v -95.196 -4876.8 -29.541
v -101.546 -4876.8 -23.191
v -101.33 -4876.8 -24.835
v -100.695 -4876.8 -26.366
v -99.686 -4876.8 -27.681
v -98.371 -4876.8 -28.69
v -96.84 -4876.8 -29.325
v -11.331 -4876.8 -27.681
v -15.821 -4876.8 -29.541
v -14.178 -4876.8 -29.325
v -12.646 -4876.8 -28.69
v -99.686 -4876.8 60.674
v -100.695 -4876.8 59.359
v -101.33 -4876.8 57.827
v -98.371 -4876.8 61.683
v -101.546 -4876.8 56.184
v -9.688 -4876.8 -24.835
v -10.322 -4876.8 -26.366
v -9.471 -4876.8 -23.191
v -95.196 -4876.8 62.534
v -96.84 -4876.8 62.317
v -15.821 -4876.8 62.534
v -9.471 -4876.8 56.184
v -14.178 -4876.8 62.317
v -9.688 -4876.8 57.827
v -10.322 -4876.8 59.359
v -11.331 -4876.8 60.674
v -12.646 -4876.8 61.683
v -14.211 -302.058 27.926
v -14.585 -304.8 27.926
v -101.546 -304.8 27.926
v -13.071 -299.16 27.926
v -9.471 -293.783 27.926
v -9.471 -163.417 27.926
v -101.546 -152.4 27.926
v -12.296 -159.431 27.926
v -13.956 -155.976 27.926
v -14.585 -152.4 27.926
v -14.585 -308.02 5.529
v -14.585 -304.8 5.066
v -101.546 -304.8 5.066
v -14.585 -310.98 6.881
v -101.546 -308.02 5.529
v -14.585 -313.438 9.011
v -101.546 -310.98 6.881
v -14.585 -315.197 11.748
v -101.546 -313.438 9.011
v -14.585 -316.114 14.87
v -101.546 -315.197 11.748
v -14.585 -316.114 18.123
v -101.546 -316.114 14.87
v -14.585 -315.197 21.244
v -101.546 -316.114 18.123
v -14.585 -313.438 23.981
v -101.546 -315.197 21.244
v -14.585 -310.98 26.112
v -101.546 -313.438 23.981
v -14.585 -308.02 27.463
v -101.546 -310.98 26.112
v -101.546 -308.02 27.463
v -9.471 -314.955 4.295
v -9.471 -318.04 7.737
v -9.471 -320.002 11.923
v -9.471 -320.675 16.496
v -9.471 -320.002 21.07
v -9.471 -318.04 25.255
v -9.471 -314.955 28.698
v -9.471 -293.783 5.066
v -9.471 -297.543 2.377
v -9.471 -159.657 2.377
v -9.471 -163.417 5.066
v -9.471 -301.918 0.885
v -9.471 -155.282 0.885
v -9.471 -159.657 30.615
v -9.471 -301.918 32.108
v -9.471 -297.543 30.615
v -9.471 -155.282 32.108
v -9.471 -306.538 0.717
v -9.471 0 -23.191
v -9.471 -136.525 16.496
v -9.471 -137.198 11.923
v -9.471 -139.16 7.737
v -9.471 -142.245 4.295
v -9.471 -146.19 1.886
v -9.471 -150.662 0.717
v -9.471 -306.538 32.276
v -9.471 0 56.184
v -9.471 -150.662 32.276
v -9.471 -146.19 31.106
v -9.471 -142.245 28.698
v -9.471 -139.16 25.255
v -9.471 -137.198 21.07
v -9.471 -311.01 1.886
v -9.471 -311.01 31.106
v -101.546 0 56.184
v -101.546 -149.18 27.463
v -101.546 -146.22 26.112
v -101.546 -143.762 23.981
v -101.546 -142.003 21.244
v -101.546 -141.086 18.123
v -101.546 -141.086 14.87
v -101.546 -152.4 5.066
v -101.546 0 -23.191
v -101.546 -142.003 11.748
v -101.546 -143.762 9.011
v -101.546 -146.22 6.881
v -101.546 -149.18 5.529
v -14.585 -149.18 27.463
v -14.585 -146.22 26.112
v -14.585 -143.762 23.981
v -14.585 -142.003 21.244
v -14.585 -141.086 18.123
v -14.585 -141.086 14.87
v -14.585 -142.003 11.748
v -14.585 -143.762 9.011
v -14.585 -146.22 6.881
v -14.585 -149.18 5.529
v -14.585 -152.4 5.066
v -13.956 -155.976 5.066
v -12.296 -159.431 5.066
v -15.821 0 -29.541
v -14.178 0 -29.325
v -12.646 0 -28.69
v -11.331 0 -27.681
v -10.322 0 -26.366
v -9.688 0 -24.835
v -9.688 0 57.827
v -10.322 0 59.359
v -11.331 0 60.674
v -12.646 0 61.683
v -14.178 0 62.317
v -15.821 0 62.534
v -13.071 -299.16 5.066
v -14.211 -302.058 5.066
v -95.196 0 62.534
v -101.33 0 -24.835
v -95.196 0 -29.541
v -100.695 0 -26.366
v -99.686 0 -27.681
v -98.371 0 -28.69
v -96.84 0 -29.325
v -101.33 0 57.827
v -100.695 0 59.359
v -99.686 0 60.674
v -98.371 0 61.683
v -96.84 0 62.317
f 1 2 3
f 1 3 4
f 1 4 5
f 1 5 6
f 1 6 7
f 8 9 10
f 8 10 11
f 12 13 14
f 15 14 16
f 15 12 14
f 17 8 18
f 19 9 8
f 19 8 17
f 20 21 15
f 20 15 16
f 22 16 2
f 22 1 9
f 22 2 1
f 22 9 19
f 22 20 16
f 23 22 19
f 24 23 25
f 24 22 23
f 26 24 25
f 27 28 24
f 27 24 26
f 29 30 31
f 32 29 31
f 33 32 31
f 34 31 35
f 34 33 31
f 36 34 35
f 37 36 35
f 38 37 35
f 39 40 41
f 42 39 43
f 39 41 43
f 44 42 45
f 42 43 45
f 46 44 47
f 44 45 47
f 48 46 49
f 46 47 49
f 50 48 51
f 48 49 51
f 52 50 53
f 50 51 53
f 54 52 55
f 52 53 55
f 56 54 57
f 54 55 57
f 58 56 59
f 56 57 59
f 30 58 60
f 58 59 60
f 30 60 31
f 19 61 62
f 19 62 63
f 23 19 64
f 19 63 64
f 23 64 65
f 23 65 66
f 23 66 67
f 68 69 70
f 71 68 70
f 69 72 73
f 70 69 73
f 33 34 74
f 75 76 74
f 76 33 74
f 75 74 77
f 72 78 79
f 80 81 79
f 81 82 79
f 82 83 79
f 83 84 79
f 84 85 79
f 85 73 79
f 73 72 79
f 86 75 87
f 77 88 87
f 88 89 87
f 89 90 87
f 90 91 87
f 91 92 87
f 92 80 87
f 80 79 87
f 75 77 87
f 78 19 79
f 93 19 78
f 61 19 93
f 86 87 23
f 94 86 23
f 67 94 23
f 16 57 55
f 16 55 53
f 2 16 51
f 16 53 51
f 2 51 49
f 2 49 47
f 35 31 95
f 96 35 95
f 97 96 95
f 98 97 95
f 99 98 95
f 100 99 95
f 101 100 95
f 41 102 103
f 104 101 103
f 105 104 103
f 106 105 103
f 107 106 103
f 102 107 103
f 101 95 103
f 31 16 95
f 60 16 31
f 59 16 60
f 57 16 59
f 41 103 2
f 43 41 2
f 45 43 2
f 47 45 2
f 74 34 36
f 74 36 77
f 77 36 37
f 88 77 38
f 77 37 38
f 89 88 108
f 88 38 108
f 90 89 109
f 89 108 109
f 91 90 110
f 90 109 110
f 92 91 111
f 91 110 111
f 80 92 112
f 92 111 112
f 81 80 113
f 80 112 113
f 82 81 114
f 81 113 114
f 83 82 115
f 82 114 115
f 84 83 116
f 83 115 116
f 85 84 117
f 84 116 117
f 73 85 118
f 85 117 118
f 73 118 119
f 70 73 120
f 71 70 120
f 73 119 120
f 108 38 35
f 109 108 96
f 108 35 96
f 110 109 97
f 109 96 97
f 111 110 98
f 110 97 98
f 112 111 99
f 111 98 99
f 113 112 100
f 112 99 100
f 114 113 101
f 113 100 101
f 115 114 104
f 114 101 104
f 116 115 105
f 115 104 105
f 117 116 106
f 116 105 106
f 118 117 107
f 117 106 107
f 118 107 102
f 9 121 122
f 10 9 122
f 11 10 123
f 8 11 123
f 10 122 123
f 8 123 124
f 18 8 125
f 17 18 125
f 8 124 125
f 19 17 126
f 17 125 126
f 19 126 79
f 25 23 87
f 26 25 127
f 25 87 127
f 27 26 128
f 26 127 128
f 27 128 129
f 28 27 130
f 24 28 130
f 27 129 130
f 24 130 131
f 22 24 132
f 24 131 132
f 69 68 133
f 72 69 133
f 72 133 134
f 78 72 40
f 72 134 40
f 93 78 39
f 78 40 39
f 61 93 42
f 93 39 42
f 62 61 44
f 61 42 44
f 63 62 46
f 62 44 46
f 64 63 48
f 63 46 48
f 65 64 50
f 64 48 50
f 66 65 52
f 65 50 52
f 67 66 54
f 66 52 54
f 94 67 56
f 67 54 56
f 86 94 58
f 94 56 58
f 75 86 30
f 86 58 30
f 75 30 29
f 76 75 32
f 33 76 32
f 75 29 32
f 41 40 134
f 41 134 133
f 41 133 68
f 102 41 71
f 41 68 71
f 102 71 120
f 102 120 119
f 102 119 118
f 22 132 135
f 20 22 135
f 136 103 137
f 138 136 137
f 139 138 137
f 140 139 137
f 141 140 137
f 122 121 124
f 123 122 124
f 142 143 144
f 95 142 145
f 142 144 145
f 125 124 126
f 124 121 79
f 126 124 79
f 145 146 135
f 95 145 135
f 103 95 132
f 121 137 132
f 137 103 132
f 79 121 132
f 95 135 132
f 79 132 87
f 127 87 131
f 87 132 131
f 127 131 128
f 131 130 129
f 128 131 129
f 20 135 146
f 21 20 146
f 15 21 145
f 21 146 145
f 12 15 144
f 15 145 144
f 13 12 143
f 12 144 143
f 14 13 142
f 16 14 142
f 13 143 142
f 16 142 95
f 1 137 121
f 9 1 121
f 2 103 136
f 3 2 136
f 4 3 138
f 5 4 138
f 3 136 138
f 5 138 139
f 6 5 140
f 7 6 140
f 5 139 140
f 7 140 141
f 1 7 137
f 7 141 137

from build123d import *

# Parameters (mm, degrees)
F1_DEPTH       = 4876.8
F3_D           = 22.86
F3_CSINK_D     = 31.75
F3_CSINK_ANGLE = 82
F4_D           = 22.86
F4_CSINK_D     = 31.75
F4_CSINK_ANGLE = 82
F5_W           = 152.4
F5_H           = 22.86
F6_DEPTH       = 101.6


with BuildPart() as f1:
    # F0 (on Front) → F1 (new body)
    with BuildSketch(Plane.XZ):
        with BuildLine():
            Line((-15.821142, 62.533787), (-95.196142, 62.533787))
            ThreePointArc((-95.196142, 62.533787), (-99.686271, 60.673915), (-101.546142, 56.183787))
            Line((-101.546142, 56.183787), (-101.546142, -23.191213))
            ThreePointArc((-101.546142, -23.191213), (-99.686271, -27.681341), (-95.196142, -29.541213))
            Line((-95.196142, -29.541213), (-15.821142, -29.541213))
            ThreePointArc((-15.821142, -29.541213), (-11.331014, -27.681341), (-9.471142, -23.191213))
            Line((-9.471142, -23.191213), (-9.471142, 56.183787))
            ThreePointArc((-9.471142, 56.183787), (-11.331014, 60.673915), (-15.821142, 62.533787))
        make_face()
    extrude(amount=F1_DEPTH)

    # F3 (through all)
    with Locations(Plane.YZ.offset(-9.471142)):
        with Locations((-304.8, 16.496287)):
            CounterSinkHole(F3_D / 2, F3_CSINK_D / 2, counter_sink_angle=F3_CSINK_ANGLE)

    # F4 (through all)
    with Locations(Plane.YZ.offset(-9.471142)):
        with Locations((-152.4, 16.496287)):
            CounterSinkHole(F4_D / 2, F4_CSINK_D / 2, counter_sink_angle=F4_CSINK_ANGLE)

    # F5 (on face) → F6 (cut)
    with BuildSketch(Plane.YZ.offset(-9.471142)):
        with Locations((-228.6, 16.496287)):
            Rectangle(F5_W, F5_H)
    extrude(amount=-F6_DEPTH, mode=Mode.SUBTRACT)


solid = f1.part
